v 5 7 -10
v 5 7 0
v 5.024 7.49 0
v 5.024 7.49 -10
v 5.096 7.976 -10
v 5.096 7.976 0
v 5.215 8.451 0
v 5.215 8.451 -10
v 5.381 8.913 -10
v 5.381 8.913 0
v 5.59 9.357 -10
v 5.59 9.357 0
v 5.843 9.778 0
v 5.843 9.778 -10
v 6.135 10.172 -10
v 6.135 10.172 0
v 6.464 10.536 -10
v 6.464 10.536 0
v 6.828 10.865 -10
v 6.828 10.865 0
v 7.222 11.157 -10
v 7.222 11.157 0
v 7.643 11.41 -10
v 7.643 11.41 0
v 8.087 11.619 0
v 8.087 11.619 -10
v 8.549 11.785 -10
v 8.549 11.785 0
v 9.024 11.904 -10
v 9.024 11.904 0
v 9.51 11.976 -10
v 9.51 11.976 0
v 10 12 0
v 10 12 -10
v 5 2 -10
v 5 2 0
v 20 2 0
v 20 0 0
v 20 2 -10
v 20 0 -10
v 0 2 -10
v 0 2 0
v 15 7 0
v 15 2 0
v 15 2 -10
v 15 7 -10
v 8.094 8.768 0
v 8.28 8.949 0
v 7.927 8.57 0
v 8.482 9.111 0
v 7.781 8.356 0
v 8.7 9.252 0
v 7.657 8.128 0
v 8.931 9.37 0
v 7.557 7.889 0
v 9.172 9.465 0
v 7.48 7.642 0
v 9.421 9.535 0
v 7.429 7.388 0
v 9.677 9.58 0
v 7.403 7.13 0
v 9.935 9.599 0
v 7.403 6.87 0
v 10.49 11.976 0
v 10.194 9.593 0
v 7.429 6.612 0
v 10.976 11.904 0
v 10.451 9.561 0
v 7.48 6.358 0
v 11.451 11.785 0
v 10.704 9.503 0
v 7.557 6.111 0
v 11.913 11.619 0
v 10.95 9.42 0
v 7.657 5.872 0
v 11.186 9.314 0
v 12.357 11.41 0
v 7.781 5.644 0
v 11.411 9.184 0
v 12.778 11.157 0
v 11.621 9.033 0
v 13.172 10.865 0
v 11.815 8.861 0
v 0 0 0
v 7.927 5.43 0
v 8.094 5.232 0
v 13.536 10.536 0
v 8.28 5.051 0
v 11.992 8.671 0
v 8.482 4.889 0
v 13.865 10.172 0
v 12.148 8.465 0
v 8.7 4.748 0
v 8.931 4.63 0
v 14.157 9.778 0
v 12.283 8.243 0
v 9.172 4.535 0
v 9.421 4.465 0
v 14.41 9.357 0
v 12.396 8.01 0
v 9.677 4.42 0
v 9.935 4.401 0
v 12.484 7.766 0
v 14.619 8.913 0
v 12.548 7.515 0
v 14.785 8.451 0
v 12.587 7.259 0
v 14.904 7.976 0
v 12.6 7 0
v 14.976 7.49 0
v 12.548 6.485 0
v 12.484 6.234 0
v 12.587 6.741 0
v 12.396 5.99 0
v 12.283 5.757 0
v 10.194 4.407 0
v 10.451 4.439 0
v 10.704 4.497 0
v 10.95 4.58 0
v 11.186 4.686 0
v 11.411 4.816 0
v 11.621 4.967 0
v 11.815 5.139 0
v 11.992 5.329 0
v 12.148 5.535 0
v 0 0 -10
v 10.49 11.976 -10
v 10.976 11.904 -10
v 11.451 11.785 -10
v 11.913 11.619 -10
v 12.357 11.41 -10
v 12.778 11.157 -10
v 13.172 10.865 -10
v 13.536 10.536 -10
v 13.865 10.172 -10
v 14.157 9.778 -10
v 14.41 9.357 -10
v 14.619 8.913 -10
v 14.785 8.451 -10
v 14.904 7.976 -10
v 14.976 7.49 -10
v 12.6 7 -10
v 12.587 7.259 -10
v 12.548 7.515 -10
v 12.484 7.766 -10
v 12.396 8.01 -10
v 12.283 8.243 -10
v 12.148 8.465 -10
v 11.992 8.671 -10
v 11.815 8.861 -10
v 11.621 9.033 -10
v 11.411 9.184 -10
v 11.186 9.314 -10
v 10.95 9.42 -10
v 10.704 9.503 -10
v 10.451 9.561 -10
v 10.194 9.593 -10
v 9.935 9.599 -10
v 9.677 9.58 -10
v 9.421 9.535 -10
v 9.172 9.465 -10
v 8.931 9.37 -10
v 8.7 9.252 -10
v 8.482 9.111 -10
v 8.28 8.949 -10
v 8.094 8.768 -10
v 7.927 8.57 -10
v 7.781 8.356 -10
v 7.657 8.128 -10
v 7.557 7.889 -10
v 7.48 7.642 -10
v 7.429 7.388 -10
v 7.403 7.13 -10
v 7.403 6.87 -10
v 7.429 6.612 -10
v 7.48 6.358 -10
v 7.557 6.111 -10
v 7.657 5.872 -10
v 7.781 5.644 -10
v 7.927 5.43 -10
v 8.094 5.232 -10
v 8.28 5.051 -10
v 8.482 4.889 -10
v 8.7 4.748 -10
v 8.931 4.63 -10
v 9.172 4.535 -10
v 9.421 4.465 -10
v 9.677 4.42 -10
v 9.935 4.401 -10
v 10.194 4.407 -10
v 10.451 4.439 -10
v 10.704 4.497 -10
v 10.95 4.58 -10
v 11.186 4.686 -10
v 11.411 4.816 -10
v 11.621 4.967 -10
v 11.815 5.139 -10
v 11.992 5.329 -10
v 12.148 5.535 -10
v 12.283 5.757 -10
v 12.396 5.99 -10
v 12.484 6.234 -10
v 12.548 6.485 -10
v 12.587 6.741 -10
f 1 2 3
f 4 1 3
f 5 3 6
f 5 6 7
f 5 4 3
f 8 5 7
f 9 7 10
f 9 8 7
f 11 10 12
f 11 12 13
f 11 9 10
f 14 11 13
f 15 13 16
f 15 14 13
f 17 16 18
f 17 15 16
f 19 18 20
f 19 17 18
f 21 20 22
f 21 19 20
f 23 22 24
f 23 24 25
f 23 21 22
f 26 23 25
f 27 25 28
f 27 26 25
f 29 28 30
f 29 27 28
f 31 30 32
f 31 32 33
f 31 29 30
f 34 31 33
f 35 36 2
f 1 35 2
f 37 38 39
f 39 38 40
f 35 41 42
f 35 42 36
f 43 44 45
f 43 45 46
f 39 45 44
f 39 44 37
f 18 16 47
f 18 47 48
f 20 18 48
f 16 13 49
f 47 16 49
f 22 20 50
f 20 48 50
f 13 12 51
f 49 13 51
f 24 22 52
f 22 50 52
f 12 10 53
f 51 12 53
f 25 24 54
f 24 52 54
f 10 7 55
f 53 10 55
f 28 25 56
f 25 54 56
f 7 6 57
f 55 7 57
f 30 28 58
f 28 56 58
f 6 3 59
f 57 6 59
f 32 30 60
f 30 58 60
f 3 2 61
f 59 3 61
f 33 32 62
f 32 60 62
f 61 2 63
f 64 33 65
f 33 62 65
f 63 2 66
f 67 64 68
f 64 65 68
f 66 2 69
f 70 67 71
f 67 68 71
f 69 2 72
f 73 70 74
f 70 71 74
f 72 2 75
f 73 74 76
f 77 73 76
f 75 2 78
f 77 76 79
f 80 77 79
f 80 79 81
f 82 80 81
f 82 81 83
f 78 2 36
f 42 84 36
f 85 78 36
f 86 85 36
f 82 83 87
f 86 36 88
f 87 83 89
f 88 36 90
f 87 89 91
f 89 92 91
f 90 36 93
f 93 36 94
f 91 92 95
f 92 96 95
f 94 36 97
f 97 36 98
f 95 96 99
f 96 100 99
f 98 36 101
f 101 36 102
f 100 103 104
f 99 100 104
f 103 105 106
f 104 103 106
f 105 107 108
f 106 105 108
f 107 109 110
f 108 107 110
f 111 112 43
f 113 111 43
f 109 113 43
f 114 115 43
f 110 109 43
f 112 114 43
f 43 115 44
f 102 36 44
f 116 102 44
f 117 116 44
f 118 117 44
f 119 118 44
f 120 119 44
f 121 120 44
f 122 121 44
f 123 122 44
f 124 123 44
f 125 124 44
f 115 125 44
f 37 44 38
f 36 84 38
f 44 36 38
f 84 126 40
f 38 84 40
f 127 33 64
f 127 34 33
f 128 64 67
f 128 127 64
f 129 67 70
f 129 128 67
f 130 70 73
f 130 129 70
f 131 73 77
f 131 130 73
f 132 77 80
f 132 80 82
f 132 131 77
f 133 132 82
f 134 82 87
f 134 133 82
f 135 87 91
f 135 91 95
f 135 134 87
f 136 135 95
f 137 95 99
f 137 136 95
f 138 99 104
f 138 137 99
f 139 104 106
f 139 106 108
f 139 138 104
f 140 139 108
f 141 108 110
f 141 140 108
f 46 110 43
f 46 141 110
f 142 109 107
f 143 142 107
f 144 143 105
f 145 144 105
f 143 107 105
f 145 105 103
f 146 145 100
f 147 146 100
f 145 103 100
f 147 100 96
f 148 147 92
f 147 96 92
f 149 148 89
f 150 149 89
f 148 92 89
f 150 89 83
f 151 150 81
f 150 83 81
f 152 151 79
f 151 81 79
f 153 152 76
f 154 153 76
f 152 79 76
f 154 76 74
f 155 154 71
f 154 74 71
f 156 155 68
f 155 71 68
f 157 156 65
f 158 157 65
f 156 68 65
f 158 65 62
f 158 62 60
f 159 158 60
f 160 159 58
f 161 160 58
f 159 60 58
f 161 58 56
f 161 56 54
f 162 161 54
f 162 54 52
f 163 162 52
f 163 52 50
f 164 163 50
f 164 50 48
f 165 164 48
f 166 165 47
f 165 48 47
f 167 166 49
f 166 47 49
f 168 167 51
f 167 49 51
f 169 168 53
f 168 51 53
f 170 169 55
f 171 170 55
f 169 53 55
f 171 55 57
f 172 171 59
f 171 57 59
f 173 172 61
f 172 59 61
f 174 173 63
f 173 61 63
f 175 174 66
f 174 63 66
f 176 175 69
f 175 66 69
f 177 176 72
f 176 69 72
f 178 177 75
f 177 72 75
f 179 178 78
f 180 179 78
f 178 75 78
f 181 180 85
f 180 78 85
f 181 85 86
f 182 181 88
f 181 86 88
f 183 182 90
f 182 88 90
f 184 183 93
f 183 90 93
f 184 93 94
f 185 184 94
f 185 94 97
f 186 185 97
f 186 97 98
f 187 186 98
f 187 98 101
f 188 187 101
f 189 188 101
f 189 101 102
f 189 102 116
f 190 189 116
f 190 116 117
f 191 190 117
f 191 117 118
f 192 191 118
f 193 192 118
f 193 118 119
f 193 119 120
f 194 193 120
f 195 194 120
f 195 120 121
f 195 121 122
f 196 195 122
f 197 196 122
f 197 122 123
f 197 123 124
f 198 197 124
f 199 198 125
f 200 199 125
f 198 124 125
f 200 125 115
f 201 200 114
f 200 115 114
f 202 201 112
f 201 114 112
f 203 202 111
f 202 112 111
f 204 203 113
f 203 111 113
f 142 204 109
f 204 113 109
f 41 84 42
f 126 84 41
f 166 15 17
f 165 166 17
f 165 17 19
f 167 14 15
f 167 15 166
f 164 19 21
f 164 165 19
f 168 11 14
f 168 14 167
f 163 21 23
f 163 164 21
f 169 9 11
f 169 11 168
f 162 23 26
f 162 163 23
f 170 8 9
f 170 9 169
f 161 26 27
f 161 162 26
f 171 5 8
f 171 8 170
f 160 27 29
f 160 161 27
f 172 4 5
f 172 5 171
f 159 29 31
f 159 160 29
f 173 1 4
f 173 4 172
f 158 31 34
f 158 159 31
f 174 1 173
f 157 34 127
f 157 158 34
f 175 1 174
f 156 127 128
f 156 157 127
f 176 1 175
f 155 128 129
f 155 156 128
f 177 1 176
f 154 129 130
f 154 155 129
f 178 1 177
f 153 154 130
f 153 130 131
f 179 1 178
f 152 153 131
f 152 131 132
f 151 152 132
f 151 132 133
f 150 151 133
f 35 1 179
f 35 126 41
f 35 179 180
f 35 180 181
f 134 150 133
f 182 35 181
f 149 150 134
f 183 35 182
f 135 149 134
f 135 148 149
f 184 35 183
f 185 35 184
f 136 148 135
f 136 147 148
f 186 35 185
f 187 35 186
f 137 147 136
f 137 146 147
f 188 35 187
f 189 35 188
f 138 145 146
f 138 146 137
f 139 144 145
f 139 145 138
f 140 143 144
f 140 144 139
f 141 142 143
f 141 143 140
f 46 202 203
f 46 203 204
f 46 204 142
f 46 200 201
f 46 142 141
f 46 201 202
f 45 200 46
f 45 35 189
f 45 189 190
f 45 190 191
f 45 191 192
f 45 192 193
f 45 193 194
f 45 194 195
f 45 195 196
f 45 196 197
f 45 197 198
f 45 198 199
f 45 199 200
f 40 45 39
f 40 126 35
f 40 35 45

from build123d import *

# Parameters (mm, degrees)
CROQUIS1_W              = 20
CROQUIS1_H              = 10
SALIENTE_EXTRUIR1_DEPTH = 2
CROQUIS2_W              = 10
CROQUIS2_H              = 10
CROQUIS2_R              = 2.6
SALIENTE_EXTRUIR2_DEPTH = 10
REDONDEO1_R             = 5


with BuildPart() as part:
    # Croquis1 → Saliente-Extruir1 (new body)
    with BuildSketch(Plane(origin=(0, 0, 0), x_dir=(1, 0, 0), z_dir=(0, 1, 0))):
        with Locations((10, 5)):
            Rectangle(CROQUIS1_W, CROQUIS1_H)
    extrude(amount=SALIENTE_EXTRUIR1_DEPTH)

    # Croquis2 → Saliente-Extruir2 (add)
    with BuildSketch(Plane.XY):
        with Locations((10, 7)):
            Rectangle(CROQUIS2_W, CROQUIS2_H)
        with Locations((10, 7)):
            Circle(CROQUIS2_R, mode=Mode.SUBTRACT)
    extrude(amount=-SALIENTE_EXTRUIR2_DEPTH)

    # Redondeo1
    redondeo1_edges = [part.edges().sort_by_distance(p)[0] for p in [
        (15, 12, -5),
        (5, 12, -5),
    ]]
    fillet(redondeo1_edges, radius=REDONDEO1_R - 0.0001)  # a hair under: the kernel refuses the full size


solid = part.part
